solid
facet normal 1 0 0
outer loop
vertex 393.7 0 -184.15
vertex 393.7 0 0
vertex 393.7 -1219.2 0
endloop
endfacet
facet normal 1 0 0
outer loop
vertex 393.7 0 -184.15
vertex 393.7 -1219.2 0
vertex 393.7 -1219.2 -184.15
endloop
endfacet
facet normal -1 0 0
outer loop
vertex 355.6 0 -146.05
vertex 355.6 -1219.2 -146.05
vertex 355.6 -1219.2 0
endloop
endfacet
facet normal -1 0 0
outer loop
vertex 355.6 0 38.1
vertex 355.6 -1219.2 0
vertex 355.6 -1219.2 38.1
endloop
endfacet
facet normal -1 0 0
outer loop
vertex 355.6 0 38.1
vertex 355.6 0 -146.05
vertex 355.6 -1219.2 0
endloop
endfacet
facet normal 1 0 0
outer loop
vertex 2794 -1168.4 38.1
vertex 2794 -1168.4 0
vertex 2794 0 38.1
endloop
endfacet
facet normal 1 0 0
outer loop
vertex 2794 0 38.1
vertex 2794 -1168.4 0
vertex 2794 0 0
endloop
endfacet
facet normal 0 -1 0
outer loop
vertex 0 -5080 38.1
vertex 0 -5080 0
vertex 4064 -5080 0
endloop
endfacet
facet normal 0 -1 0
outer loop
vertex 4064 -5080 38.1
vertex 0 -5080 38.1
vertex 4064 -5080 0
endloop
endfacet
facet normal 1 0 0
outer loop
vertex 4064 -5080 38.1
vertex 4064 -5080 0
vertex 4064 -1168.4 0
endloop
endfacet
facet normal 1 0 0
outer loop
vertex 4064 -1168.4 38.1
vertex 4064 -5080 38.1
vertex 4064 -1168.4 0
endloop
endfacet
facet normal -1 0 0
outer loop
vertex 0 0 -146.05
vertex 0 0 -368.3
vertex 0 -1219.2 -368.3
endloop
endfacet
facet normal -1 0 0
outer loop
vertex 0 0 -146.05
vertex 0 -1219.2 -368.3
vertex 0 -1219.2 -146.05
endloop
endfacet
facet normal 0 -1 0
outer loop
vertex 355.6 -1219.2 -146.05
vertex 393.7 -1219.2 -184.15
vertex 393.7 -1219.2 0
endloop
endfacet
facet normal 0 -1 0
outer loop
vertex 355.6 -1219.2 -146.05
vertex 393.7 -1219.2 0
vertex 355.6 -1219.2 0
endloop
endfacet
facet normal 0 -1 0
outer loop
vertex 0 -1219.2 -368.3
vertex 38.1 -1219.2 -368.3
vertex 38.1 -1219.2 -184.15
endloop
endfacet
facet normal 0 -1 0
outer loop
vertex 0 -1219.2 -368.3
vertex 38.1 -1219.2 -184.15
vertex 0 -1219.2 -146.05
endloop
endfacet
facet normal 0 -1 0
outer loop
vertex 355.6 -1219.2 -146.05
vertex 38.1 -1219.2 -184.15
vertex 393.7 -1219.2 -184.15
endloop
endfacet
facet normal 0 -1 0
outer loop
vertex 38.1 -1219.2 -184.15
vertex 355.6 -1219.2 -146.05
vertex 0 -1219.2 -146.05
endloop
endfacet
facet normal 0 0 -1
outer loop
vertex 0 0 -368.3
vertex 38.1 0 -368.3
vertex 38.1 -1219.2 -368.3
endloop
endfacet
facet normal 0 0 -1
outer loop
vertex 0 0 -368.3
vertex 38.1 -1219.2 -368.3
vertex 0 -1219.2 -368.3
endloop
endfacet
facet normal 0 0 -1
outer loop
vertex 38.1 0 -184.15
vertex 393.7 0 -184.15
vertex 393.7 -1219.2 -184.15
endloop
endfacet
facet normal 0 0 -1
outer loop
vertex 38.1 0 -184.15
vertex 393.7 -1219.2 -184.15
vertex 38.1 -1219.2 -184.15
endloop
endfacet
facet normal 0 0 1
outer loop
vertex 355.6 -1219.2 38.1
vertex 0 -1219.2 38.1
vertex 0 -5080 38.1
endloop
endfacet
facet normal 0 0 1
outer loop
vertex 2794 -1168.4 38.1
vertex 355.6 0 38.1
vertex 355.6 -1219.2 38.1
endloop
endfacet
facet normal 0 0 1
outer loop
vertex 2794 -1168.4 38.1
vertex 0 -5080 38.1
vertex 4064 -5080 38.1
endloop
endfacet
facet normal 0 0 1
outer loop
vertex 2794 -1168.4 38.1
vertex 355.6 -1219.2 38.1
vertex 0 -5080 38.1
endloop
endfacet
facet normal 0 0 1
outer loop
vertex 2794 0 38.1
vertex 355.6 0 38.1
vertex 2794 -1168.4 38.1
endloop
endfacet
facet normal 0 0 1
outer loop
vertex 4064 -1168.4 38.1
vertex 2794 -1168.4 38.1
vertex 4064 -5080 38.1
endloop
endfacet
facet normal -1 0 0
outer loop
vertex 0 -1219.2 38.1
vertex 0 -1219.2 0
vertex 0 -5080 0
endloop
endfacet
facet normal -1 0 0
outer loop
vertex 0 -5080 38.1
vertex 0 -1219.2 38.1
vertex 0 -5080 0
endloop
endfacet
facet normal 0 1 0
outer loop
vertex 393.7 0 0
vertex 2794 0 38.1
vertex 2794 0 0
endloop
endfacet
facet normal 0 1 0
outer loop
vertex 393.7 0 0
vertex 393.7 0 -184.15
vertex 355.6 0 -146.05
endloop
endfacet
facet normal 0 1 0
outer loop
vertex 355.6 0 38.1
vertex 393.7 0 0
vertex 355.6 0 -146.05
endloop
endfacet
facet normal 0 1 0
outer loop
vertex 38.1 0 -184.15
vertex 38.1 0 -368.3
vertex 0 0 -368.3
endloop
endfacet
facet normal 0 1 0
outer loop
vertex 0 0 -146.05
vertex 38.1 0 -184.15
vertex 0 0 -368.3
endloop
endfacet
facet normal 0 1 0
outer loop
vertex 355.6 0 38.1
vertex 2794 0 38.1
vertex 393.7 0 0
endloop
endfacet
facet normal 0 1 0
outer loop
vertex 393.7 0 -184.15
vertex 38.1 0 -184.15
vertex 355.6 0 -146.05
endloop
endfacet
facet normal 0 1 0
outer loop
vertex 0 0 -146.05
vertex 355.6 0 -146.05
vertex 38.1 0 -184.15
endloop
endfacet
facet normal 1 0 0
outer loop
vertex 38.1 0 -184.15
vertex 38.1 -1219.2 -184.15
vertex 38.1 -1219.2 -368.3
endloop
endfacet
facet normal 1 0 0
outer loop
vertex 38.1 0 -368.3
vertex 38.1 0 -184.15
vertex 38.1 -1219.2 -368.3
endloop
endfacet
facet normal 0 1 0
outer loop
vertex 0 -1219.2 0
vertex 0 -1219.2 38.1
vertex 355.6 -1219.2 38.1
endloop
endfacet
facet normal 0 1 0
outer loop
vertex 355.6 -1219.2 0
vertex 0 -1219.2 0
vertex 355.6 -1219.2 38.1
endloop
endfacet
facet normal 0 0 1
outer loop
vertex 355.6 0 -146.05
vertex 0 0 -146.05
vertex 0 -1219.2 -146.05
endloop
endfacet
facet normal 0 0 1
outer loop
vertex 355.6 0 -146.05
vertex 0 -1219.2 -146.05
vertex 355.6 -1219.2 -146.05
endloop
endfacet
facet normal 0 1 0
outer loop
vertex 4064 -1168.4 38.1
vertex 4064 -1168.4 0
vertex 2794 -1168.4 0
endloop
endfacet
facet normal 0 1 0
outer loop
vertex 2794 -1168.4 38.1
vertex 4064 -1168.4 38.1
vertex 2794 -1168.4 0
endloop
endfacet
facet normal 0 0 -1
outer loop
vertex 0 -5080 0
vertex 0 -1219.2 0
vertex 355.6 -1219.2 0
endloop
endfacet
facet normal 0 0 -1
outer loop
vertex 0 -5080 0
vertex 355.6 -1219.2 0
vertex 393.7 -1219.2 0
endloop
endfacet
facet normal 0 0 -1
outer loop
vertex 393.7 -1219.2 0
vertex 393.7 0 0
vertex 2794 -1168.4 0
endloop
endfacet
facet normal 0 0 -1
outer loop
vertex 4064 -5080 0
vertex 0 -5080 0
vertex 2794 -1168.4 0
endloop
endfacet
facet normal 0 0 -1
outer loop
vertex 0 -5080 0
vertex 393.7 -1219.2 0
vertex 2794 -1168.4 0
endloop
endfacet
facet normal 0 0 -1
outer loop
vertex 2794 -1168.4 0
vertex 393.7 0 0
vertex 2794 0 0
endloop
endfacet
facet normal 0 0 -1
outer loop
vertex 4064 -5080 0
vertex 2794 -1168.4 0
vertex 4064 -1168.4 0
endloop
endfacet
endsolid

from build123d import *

# Parameters (mm, degrees)
F1_DEPTH = 38.1
F2_W     = 355.6
F2_H     = 1219.2
F3_DEPTH = 38.1
F5_DEPTH = 1219.2


with BuildPart() as f1:
    # F0 (on Top) → F1 (new body)
    with BuildSketch(Plane.XY):
        Polygon((2794, 0), (0, 0), (0, -5080), (4064, -5080), (4064, -1168.4), (2794, -1168.4), align=None)
    extrude(amount=F1_DEPTH)

    # F2 (on face) → F3 (cut)
    with BuildSketch(Plane.XY.offset(38.1)):
        with Locations((177.8, -609.6)):
            Rectangle(F2_W, F2_H)
    extrude(amount=-F3_DEPTH, mode=Mode.SUBTRACT)

    # F4 (on face) → F5 (join)
    with BuildSketch(Plane(origin=(0, 0, 0), x_dir=(-1, 0, 0), z_dir=(0, 1, 0))):
        Polygon((-355.6, -146.05), (-355.6, 0), (-393.7, 0), (-393.7, -184.15), (-38.1, -184.15), (-38.1, -368.3), (0, -368.3), (0, -146.05), (-317.5, -146.05), align=None)
    extrude(amount=-F5_DEPTH)


solid = f1.part
